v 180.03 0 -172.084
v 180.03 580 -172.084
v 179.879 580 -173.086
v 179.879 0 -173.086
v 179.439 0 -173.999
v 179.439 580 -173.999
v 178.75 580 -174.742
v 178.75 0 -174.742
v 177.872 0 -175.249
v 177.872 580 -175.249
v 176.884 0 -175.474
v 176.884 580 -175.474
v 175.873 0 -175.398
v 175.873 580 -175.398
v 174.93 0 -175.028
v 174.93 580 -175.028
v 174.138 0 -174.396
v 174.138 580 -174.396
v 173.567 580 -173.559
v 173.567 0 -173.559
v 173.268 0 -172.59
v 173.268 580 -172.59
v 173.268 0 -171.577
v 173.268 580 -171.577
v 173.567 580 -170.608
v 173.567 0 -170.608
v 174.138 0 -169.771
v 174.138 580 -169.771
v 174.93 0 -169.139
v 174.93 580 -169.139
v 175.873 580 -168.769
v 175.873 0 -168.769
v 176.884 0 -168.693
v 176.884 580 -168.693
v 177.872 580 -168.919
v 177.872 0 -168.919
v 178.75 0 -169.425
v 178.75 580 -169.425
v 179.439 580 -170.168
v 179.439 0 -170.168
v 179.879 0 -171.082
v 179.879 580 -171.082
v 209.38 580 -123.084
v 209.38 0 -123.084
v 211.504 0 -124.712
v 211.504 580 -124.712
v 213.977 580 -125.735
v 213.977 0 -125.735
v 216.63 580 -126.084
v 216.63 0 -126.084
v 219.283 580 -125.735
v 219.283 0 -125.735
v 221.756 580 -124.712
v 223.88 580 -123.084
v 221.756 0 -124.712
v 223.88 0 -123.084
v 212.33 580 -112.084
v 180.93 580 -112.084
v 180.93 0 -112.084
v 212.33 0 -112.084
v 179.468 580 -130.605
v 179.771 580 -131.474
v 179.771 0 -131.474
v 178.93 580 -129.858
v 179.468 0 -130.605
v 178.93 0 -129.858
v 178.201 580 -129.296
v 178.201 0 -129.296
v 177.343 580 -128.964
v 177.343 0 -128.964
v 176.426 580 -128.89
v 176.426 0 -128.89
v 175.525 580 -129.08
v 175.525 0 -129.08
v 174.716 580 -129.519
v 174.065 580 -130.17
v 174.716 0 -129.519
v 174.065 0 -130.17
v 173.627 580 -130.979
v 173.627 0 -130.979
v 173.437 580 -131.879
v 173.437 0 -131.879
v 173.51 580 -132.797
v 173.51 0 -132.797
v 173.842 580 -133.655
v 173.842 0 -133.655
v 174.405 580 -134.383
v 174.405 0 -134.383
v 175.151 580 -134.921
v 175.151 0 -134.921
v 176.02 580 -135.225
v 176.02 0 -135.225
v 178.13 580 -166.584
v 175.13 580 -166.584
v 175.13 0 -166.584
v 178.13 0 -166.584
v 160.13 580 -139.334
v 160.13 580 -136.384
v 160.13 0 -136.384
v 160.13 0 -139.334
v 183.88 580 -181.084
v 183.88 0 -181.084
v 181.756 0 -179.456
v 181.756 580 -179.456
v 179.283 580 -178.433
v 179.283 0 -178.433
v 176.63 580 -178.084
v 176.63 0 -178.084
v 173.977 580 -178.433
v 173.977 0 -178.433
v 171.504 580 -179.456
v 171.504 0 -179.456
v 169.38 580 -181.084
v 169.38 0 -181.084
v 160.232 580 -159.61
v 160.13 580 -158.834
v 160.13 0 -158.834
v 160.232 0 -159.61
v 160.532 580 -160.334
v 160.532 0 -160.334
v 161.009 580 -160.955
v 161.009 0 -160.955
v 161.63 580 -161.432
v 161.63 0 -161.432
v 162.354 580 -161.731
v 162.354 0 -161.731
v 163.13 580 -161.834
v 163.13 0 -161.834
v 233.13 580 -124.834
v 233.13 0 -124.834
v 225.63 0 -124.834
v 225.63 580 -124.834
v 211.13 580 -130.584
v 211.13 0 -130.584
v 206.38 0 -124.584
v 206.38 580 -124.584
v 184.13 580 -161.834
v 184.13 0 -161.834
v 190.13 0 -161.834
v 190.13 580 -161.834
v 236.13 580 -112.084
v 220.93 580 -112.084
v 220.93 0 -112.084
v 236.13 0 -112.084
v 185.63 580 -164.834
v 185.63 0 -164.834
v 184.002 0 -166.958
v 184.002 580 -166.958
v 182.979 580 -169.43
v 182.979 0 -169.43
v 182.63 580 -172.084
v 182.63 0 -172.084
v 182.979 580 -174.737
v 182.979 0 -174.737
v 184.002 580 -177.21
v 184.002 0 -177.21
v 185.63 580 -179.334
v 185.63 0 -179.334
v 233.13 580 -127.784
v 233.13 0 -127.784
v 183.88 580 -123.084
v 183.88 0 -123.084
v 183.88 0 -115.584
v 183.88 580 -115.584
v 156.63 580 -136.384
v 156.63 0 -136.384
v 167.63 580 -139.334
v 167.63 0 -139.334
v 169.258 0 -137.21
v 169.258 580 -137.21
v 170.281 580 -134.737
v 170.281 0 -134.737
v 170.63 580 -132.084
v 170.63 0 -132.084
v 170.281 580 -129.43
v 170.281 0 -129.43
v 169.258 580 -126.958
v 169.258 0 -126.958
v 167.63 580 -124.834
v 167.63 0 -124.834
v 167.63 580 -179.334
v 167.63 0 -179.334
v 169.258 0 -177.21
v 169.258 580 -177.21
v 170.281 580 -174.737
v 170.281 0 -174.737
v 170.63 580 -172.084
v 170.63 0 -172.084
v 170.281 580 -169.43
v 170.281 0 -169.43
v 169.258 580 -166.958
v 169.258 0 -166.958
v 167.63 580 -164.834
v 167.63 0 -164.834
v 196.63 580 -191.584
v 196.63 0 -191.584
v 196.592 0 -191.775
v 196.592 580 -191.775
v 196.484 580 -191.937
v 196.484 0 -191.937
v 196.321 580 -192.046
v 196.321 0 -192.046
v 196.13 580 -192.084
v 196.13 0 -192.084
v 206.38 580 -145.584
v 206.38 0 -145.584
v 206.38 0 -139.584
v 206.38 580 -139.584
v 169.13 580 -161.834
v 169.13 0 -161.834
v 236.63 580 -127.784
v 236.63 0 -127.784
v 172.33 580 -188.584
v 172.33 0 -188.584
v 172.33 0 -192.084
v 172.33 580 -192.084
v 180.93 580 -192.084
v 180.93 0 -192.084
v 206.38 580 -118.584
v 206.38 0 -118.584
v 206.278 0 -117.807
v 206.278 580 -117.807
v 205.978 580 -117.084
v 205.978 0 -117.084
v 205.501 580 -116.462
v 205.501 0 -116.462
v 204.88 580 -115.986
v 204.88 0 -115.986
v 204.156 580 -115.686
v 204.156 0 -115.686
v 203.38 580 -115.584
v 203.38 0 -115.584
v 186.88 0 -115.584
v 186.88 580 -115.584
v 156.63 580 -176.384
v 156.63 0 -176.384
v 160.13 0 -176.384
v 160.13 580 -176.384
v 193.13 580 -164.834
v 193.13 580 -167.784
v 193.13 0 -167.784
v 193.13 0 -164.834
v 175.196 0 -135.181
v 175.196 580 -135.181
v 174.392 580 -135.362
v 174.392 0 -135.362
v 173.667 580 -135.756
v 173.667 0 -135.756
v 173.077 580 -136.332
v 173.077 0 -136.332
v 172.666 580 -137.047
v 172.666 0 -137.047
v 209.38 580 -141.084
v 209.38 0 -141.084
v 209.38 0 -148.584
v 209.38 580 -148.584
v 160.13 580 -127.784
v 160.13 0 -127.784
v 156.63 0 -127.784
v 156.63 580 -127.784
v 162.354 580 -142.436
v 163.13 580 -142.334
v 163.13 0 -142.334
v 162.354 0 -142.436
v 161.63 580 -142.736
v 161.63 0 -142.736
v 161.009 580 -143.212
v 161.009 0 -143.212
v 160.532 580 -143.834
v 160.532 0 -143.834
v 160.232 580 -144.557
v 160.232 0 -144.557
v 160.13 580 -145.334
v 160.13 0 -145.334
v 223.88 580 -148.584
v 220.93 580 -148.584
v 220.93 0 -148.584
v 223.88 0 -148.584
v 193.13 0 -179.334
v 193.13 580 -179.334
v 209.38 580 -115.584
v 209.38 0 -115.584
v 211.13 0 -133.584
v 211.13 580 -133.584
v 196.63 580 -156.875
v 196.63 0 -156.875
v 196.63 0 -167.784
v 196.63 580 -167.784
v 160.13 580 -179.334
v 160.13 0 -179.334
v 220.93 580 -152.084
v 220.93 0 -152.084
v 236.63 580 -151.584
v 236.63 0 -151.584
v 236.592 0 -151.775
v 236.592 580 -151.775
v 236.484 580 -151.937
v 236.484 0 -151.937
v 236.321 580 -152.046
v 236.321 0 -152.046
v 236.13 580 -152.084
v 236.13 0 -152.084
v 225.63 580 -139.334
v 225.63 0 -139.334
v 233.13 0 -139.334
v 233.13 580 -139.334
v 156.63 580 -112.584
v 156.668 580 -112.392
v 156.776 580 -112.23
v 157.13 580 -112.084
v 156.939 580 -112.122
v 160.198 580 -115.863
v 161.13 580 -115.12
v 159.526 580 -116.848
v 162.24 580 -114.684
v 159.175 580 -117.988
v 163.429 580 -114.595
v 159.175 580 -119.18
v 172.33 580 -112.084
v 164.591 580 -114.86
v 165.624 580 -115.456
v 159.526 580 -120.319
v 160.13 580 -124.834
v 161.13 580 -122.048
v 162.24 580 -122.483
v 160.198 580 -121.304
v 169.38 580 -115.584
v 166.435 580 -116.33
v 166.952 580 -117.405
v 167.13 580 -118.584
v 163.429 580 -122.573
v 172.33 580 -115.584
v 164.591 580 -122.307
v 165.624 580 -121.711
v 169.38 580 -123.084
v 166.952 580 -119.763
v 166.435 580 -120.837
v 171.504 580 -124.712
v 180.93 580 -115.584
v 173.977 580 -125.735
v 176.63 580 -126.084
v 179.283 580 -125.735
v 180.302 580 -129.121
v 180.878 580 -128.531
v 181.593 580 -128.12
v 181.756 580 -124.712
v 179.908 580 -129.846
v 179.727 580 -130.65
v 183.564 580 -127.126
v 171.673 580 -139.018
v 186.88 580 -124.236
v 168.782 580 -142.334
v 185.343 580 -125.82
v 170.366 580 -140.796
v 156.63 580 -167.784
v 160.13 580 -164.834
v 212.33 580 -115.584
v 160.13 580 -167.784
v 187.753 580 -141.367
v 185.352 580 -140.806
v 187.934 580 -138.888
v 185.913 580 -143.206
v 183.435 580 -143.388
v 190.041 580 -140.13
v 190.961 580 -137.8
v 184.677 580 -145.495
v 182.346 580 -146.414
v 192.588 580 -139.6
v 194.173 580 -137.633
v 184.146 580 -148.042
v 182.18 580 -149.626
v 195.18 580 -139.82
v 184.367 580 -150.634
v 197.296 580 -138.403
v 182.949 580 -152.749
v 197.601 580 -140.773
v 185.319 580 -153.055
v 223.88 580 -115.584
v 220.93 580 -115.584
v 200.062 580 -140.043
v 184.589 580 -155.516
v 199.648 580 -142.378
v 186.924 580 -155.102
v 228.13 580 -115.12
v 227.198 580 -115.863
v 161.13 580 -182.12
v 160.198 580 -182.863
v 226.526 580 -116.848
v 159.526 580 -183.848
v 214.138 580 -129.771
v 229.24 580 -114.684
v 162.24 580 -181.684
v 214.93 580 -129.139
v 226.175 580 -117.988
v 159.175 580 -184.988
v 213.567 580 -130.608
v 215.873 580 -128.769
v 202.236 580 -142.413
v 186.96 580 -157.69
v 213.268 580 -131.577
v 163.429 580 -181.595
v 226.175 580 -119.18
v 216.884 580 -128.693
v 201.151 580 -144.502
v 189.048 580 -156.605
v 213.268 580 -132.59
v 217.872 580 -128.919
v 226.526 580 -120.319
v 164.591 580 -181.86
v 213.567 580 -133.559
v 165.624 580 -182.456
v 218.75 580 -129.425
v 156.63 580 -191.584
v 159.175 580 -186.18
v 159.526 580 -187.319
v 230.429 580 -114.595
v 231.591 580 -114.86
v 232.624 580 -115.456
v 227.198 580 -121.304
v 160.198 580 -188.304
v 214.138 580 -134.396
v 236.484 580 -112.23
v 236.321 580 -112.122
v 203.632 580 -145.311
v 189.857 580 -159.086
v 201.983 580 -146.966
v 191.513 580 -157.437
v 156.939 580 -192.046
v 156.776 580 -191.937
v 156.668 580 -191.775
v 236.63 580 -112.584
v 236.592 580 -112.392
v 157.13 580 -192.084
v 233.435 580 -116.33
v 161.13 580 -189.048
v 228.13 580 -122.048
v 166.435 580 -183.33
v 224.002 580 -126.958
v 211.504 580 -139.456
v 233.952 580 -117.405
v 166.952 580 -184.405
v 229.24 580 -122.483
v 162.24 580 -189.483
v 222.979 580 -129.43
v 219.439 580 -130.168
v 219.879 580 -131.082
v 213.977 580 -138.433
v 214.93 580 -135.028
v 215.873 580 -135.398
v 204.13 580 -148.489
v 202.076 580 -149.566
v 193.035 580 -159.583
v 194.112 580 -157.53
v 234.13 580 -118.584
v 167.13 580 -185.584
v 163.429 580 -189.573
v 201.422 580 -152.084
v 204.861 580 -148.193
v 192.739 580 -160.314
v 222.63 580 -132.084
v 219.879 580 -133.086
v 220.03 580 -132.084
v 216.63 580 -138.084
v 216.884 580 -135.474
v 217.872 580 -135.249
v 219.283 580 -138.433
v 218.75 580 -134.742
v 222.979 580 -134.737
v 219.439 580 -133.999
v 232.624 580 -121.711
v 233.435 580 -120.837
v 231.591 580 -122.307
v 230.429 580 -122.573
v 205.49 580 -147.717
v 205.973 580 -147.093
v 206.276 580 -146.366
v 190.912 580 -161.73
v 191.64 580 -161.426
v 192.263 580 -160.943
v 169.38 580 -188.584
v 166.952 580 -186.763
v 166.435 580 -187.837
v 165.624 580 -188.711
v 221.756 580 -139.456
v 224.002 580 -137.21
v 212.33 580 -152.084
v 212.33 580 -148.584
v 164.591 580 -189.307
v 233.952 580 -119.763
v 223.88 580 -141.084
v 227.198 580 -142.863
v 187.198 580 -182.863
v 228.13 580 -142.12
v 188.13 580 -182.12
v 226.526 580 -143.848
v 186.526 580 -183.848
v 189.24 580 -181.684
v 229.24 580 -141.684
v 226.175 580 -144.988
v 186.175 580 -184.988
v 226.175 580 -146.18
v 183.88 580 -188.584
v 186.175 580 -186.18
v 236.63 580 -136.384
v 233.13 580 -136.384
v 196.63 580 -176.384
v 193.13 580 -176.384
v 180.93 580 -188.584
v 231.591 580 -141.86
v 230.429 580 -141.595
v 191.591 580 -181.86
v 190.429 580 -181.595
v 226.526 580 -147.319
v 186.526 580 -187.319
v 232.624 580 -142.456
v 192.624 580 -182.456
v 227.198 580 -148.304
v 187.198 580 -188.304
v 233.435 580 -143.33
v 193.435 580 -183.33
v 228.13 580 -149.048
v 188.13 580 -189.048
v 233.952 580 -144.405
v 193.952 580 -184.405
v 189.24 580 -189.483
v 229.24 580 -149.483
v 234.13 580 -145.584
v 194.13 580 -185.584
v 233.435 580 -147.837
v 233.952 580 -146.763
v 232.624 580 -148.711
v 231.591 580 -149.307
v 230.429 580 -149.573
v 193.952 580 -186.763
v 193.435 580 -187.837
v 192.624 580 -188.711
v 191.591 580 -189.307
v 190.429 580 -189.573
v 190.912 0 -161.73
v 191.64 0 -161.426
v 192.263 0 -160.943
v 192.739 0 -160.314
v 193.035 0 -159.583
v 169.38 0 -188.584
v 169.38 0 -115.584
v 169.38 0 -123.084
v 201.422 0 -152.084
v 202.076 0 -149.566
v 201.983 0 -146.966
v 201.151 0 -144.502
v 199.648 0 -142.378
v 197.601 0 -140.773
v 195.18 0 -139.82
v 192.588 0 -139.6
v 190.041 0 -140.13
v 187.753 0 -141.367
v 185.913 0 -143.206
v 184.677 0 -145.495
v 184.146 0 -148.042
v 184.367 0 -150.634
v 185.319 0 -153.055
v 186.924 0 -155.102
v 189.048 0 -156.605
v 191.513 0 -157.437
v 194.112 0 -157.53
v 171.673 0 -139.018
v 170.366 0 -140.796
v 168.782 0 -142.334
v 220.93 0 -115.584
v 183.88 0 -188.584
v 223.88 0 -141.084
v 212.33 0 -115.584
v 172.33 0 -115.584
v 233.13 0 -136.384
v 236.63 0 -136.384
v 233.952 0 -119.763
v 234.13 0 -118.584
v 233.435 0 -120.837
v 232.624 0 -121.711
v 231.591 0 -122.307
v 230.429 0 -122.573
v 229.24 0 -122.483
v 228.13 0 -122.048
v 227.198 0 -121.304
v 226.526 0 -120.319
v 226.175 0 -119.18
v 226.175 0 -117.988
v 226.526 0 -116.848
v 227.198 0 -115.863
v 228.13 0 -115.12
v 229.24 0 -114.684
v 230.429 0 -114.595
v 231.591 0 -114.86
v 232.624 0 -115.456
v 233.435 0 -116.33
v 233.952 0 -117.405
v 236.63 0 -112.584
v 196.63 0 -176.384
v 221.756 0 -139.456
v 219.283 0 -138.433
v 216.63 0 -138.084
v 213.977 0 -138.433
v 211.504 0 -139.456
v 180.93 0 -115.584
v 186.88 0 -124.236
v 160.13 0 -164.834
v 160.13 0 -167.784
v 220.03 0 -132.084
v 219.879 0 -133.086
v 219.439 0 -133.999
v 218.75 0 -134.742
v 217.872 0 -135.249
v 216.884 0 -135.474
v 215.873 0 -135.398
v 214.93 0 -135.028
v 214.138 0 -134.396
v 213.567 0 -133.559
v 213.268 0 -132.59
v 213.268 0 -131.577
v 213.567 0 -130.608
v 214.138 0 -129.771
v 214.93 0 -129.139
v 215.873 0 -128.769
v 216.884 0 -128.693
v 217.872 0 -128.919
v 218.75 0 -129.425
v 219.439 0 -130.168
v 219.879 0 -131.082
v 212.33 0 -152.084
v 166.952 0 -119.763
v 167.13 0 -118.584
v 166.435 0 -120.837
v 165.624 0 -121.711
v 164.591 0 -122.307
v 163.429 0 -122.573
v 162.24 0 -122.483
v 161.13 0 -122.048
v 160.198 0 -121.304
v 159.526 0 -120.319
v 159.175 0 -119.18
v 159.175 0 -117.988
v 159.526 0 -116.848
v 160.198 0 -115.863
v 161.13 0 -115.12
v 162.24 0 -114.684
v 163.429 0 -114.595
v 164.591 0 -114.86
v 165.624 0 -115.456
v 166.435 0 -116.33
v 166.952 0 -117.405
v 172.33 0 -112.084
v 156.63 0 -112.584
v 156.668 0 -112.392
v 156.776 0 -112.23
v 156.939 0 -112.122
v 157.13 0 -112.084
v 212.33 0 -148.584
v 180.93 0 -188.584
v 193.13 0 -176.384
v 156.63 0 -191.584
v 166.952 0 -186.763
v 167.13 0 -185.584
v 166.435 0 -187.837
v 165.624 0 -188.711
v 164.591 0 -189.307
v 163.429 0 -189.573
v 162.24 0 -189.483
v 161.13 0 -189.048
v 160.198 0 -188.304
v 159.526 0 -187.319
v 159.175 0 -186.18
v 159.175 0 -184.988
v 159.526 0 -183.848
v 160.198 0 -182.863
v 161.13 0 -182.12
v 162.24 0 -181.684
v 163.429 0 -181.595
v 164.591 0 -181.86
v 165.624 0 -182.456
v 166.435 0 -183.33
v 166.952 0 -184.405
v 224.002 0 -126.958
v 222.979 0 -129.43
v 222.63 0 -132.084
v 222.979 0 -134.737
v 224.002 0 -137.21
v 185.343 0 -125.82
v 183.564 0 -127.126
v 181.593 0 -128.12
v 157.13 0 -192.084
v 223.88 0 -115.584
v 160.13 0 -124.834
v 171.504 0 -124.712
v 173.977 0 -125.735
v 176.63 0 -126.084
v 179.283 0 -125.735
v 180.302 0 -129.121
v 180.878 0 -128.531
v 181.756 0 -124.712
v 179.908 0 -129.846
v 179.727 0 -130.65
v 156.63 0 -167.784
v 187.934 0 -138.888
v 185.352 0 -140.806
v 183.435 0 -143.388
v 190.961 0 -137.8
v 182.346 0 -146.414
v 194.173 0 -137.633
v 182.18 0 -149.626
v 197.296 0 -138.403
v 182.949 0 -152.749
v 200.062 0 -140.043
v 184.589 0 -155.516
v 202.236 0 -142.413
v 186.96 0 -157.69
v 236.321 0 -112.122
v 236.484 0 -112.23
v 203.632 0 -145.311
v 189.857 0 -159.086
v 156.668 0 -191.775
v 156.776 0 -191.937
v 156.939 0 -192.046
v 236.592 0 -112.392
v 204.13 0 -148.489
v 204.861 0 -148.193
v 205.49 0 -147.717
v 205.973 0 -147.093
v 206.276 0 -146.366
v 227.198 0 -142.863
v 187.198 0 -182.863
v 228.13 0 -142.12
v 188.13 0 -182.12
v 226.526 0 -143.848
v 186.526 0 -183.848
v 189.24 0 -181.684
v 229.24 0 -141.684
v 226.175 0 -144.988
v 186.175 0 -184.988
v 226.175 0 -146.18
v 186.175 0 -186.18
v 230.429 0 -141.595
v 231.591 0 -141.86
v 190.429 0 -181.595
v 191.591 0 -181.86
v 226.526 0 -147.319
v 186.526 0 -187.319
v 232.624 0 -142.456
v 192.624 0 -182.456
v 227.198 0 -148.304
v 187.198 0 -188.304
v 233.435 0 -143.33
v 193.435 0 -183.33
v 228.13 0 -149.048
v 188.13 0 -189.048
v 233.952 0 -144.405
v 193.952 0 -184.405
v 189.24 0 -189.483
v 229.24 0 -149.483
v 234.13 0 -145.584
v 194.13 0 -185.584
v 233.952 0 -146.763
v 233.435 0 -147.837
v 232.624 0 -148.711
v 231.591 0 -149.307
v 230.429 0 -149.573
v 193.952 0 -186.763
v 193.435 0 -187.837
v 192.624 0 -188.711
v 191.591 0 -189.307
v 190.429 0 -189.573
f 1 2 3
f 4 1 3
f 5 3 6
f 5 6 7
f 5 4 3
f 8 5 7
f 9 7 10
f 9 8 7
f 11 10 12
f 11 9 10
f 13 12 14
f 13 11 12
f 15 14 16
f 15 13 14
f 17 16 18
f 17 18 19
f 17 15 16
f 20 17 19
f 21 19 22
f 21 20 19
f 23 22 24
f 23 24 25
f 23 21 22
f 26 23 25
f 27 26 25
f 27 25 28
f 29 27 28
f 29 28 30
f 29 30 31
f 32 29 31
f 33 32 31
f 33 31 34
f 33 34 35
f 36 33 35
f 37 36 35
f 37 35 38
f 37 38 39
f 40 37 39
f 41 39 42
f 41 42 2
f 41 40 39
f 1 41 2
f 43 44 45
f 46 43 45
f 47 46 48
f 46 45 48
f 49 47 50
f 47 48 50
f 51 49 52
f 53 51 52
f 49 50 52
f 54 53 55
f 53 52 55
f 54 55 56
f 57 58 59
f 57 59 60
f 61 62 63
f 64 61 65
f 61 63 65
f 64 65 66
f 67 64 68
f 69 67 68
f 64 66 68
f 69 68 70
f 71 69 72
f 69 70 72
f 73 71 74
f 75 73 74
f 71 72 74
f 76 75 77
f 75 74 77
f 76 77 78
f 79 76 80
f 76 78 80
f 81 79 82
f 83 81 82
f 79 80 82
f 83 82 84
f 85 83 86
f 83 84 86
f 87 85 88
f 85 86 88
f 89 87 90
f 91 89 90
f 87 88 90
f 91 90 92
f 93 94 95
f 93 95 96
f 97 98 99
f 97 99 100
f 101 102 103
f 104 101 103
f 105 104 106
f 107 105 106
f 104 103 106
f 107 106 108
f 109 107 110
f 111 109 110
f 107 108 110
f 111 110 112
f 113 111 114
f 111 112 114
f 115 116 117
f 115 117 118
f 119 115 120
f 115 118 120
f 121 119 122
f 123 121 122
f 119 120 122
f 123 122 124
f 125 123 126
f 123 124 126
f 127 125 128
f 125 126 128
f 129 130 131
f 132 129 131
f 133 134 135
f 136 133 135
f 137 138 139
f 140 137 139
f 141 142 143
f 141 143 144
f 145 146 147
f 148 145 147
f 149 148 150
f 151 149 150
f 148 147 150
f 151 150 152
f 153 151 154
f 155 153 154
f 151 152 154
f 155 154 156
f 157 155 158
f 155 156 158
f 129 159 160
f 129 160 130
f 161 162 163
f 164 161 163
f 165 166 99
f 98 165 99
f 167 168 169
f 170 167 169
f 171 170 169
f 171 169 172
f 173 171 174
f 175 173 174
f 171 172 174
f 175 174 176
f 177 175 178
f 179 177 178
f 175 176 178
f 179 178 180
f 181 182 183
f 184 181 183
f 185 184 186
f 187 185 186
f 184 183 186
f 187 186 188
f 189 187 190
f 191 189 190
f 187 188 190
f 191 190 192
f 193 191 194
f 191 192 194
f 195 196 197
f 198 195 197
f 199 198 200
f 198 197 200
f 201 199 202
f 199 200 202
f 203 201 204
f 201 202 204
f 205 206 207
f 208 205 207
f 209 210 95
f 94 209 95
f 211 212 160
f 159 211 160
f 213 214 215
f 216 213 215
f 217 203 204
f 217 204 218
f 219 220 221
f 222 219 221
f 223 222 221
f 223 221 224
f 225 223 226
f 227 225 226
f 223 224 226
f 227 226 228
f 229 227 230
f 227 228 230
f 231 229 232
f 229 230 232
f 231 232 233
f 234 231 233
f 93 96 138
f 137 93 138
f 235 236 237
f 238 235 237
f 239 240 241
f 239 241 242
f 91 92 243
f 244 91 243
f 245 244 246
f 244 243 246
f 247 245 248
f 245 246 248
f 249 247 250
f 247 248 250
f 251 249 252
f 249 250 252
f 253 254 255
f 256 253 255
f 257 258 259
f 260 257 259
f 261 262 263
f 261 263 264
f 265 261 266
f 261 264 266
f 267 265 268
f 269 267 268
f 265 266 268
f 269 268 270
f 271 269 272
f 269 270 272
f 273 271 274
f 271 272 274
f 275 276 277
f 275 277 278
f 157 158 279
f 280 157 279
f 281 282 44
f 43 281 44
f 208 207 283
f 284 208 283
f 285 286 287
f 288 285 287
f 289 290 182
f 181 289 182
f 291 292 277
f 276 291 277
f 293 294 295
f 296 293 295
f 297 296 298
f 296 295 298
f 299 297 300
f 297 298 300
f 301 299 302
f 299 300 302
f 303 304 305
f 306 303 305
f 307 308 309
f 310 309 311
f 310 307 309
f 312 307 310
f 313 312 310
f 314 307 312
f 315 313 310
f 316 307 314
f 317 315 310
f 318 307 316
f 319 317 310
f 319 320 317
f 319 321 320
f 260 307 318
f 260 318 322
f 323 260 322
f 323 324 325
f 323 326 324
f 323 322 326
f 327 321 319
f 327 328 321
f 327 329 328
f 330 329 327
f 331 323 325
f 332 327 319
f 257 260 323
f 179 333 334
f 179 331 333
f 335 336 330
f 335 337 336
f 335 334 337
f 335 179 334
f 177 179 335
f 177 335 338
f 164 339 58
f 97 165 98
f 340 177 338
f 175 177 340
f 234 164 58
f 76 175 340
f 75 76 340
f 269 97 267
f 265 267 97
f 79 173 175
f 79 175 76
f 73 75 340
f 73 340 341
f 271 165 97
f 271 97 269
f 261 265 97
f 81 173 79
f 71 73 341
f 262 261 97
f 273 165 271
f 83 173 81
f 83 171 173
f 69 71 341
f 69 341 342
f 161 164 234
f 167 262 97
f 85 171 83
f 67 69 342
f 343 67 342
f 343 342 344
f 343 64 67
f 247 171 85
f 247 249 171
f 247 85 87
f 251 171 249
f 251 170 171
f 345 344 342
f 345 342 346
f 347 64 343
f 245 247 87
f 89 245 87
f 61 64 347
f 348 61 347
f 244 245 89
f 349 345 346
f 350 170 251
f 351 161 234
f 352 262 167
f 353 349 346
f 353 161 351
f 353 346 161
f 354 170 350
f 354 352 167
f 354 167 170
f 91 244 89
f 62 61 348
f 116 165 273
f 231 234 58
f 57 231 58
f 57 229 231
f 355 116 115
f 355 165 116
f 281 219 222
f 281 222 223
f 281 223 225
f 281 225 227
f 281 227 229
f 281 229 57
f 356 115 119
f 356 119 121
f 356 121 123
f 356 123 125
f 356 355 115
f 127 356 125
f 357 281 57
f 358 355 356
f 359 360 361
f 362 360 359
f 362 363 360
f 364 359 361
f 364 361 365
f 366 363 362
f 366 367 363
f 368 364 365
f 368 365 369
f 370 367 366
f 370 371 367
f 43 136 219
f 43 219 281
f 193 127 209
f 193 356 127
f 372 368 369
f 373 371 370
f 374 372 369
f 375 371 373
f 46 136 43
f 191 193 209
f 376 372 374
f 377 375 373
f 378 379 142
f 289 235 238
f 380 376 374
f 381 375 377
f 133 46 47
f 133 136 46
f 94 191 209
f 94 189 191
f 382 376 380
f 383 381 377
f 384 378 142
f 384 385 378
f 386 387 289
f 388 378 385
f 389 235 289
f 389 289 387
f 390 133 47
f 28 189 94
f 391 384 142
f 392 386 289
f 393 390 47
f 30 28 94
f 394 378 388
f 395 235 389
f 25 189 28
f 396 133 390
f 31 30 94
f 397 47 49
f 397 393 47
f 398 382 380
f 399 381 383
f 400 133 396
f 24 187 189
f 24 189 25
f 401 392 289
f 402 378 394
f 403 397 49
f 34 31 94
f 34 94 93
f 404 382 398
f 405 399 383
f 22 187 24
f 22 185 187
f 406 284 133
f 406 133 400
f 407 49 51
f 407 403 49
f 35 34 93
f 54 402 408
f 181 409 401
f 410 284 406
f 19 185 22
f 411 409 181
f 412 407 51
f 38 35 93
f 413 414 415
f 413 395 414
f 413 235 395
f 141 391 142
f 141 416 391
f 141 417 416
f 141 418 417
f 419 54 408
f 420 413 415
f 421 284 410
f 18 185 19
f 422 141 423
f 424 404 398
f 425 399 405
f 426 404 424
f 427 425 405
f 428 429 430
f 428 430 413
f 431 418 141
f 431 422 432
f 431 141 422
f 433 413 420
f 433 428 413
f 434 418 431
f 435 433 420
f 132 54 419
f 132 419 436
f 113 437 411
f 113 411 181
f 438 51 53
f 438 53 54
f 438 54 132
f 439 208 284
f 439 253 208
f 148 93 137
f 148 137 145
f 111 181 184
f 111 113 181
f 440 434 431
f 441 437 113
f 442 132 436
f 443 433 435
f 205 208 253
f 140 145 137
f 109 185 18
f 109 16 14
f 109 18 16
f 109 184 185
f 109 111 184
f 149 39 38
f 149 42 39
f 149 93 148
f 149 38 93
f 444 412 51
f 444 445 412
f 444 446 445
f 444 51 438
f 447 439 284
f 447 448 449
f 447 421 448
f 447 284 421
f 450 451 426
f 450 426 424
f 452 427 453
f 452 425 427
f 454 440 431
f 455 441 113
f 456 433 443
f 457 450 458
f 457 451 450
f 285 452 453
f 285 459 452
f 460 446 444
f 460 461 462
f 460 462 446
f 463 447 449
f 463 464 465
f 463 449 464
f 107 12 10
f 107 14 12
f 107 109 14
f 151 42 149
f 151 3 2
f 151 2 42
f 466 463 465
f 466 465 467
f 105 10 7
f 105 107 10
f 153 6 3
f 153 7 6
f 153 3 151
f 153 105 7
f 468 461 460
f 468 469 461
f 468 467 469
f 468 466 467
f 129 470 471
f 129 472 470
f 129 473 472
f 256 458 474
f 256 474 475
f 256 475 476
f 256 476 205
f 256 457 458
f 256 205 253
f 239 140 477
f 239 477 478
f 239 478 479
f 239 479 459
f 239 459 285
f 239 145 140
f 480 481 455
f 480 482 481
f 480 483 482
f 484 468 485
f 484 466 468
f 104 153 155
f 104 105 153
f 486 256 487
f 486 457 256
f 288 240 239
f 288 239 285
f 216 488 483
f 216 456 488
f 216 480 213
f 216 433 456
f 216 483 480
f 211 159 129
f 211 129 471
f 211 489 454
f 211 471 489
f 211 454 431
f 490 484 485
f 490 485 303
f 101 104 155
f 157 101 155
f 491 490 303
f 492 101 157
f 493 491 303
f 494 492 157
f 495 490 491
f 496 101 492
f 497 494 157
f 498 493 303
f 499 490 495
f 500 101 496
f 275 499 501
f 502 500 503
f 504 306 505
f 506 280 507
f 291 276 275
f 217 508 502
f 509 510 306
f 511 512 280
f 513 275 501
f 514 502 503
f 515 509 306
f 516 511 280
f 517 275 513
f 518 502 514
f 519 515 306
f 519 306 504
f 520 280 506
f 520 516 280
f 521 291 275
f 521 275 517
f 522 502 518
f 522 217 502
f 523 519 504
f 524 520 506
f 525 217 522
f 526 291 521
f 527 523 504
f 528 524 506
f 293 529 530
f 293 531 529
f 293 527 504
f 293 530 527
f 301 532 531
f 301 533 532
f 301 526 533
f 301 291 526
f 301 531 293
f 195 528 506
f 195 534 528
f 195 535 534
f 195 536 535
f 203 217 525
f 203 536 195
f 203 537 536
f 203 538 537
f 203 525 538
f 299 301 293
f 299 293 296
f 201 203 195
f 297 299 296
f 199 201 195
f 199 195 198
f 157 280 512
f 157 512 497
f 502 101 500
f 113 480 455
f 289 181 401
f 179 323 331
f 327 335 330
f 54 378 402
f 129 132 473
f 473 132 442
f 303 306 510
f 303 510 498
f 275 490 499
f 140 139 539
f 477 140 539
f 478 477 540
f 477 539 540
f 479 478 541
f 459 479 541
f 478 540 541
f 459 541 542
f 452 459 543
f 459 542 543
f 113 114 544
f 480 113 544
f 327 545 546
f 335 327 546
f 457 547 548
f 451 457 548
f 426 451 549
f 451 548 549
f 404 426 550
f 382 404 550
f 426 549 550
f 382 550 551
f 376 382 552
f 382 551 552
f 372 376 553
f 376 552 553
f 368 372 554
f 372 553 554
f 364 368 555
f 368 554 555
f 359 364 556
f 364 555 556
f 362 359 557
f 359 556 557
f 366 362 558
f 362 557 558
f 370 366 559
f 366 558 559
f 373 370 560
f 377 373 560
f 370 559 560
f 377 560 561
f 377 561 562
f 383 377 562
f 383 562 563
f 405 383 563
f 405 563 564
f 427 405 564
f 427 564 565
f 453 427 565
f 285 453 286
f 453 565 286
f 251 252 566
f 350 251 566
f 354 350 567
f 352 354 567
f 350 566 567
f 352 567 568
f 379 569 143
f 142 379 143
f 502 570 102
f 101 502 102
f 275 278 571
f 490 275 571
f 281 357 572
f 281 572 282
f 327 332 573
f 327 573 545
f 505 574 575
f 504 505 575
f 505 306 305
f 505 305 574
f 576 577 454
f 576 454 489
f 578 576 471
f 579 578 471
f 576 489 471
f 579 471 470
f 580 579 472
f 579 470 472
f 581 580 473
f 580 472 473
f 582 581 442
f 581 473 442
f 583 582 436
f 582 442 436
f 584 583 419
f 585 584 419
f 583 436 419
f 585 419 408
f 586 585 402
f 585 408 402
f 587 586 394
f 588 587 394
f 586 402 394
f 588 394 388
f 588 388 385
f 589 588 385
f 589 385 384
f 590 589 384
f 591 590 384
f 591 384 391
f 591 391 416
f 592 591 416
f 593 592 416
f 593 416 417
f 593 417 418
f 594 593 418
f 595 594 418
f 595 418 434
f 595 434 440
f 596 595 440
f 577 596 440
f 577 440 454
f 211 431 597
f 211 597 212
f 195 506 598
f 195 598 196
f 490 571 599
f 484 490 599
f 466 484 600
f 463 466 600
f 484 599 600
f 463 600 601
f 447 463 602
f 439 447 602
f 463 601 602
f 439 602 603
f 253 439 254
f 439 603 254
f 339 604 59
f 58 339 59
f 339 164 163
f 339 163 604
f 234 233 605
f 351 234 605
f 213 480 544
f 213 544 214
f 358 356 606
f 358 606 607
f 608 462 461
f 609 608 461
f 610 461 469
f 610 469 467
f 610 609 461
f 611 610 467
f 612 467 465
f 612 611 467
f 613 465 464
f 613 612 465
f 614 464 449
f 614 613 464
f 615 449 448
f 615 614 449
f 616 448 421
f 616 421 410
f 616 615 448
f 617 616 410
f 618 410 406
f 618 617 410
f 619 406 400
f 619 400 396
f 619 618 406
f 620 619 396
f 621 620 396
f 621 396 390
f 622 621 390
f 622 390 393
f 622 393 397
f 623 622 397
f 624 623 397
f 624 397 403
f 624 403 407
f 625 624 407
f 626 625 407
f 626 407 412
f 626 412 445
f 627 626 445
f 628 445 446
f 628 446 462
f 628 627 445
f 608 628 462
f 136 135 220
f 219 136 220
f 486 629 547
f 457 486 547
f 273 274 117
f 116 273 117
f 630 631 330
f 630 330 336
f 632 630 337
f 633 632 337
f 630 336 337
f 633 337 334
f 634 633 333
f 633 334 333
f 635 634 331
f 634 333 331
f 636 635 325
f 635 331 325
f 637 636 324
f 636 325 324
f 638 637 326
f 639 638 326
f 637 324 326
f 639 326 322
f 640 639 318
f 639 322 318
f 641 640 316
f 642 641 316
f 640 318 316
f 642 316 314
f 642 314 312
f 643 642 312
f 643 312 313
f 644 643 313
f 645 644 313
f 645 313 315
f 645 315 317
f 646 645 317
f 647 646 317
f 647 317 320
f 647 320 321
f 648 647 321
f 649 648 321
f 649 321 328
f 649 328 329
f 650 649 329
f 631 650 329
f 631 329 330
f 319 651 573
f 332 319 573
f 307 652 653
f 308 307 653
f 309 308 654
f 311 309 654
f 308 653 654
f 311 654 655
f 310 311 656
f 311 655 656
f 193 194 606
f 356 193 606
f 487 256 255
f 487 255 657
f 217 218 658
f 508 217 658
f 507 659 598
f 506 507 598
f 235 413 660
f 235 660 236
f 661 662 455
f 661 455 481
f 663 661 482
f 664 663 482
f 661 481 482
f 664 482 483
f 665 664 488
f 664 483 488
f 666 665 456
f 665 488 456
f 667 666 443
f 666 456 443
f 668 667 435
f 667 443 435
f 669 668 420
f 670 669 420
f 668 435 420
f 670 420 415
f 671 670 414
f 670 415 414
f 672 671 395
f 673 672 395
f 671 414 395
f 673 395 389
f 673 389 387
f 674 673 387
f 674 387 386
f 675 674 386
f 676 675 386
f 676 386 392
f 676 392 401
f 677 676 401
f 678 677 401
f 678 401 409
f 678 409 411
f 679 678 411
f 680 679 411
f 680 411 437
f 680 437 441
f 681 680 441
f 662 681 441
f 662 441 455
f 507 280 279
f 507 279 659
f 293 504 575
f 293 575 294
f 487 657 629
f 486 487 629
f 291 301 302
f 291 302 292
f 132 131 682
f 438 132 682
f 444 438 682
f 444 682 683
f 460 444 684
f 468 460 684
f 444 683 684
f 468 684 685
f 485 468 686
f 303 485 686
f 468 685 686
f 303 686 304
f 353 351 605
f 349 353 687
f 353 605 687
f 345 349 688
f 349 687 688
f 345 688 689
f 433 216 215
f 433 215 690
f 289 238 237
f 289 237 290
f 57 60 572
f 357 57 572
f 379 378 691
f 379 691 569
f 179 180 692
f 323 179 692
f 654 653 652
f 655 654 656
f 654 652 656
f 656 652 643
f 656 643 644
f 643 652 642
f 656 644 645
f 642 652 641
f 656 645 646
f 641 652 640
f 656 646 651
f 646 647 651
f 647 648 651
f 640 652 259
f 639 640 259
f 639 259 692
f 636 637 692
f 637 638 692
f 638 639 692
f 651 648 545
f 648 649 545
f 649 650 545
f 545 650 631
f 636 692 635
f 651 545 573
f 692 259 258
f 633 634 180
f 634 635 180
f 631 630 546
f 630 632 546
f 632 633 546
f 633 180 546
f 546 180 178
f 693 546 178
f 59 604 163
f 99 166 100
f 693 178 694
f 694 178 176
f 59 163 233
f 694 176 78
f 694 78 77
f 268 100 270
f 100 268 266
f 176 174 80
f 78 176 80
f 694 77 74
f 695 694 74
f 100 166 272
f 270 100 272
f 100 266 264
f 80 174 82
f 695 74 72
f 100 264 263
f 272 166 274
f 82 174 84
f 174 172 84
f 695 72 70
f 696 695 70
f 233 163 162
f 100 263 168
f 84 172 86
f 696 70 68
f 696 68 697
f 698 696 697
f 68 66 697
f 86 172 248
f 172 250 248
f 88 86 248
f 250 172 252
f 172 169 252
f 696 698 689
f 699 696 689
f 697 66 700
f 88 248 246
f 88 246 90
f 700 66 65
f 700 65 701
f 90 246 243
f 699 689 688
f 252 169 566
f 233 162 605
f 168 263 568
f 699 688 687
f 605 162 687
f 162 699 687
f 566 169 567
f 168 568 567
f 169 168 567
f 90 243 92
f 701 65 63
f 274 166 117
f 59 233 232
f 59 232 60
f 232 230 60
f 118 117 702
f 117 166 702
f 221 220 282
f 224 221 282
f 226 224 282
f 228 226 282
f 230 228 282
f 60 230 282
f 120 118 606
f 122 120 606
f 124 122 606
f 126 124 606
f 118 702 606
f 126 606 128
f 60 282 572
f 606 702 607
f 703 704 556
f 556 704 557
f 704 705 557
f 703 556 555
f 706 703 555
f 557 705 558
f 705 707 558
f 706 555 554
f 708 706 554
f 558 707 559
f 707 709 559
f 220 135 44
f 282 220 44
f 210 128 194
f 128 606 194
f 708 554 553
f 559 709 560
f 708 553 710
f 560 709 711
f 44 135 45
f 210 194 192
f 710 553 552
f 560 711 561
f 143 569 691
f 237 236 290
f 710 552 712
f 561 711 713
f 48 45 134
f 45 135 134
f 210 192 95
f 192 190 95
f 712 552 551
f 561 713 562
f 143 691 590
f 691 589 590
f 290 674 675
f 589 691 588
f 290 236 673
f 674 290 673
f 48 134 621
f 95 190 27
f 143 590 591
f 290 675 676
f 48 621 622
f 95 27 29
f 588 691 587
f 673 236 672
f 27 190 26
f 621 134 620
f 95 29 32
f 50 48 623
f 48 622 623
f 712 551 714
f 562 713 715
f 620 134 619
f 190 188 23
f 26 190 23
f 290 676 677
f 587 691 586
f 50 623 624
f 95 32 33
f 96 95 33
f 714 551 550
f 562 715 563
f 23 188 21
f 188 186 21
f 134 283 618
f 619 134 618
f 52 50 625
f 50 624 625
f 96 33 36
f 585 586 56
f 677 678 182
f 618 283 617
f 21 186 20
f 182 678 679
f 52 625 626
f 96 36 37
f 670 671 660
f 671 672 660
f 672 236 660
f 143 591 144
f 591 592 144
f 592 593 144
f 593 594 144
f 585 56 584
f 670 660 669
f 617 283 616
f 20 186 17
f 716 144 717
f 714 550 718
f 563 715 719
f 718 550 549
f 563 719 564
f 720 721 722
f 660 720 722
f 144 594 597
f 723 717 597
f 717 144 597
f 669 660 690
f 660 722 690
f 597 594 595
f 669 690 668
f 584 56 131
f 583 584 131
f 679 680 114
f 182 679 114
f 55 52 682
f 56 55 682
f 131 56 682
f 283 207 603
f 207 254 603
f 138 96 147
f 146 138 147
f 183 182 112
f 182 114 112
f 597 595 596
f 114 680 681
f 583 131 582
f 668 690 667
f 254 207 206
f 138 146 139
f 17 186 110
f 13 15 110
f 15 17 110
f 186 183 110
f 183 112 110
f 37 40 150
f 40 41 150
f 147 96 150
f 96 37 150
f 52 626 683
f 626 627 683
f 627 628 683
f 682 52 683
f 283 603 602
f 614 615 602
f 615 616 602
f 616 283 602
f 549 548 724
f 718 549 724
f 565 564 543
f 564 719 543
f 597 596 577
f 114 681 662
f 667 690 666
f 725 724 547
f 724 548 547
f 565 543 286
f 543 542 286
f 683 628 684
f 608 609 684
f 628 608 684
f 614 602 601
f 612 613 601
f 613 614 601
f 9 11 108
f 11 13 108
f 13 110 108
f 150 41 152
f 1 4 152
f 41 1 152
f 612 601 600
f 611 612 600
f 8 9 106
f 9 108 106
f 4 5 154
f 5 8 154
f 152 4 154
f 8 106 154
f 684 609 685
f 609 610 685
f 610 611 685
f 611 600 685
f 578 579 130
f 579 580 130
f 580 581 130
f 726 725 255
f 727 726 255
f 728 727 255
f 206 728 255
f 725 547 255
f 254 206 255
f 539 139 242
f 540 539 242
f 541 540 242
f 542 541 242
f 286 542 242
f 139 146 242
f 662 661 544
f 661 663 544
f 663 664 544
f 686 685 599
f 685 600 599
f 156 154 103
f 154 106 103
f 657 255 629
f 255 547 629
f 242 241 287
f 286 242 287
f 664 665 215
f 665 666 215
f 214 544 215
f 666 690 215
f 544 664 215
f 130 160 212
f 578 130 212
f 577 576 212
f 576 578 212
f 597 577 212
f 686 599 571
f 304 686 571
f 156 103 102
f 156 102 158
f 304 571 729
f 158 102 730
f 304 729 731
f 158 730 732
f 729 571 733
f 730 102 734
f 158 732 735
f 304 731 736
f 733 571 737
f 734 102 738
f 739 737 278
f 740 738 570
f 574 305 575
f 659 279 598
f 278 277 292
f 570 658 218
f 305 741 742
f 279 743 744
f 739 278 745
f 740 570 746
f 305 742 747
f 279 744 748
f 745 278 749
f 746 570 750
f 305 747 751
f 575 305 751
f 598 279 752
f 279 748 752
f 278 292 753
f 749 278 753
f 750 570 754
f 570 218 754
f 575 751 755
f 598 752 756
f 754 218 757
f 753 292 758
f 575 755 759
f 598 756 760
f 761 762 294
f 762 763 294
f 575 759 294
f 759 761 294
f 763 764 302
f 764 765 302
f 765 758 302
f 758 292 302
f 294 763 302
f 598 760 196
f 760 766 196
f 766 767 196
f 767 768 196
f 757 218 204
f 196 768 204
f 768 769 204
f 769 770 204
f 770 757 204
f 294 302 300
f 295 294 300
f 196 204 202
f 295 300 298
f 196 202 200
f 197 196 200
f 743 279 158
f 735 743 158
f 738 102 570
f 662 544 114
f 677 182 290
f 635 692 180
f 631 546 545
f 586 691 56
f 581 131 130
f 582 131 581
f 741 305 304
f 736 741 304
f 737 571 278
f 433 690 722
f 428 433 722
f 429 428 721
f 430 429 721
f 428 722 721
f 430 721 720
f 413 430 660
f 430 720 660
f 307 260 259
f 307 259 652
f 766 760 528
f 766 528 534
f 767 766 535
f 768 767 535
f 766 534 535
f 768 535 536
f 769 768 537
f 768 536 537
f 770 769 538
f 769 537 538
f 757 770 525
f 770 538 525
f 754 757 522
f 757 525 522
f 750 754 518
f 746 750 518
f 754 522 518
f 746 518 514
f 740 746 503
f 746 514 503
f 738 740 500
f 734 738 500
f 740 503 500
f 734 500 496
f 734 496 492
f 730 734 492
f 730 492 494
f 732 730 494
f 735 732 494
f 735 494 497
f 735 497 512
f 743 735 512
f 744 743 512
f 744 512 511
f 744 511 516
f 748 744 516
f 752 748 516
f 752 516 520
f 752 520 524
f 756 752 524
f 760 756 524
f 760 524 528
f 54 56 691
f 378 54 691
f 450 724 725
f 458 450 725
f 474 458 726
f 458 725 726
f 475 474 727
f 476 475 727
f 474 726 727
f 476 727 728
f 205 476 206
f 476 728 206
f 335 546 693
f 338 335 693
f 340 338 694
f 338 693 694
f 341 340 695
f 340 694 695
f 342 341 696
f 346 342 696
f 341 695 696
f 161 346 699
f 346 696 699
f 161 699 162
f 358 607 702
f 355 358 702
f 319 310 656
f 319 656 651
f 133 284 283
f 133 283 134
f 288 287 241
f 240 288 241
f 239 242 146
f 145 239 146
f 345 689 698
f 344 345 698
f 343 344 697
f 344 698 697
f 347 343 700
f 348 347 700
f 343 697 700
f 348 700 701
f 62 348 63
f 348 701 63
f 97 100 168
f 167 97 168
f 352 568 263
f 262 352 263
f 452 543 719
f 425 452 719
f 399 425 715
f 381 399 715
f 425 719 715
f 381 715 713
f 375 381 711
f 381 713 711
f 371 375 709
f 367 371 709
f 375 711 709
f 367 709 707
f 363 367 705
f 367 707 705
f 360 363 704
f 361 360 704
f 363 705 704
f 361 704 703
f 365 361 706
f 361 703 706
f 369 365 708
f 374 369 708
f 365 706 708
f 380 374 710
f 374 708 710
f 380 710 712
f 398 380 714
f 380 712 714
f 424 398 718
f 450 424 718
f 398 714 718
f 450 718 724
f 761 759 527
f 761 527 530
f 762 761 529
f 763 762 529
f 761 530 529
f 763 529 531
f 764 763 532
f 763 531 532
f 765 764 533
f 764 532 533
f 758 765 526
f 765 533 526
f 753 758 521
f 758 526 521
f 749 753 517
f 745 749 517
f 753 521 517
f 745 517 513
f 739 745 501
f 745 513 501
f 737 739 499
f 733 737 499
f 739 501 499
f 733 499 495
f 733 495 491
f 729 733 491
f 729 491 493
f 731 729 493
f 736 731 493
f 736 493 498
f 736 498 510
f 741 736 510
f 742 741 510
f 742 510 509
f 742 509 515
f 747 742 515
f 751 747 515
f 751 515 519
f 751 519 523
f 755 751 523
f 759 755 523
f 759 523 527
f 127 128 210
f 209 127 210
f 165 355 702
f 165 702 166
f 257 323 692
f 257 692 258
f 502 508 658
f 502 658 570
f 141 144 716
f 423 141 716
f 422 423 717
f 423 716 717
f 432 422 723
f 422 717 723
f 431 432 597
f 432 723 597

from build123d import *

# Parameters (mm, degrees)
SKETCH_2_R          = 4
SKETCH_2_R_2        = 3.4
EXTRUDE_1_DEPTH     = 580
SKETCH_3_R          = 5.341354258
SKETCH_3_R_2        = 5.383492222
SKETCH_3_R_3        = 4.933832051
SKETCH_3_R_4        = 5.418030405
SKETCH_3_R_5        = 5.574298651
EXTRUDE_2_DEPTH     = 580
SKETCH_4_R          = 4
CUT_EXTRUDE_1_DEPTH = 581


with BuildPart() as part:
    # 草图2 → 凸台-拉伸1 (new body)
    with BuildSketch(Plane(origin=(0, 0, 0), x_dir=(1, 0, 0), z_dir=(0, 1, 0))):
        with BuildLine():
            Line((212.330022346, 152.083698324), (201.421584322, 152.083698324))
            ThreePointArc((201.421584322, 152.083698324), (186.766061316, 142.219737293), (196.630022346, 156.8752603))
            Line((196.630022346, 156.8752603), (196.630022346, 167.783698324))
            Line((196.630022346, 167.783698324), (193.130022346, 167.783698324))
            Line((193.130022346, 167.783698324), (193.130022346, 164.833698324))
            Line((193.130022346, 164.833698324), (185.630022346, 164.833698324))
            ThreePointArc((185.630022346, 164.833698324), (182.630022346, 172.083698324), (185.630022346, 179.333698324))
            Line((185.630022346, 179.333698324), (193.130022346, 179.333698324))
            Line((193.130022346, 179.333698324), (193.130022346, 176.383698324))
            Line((193.130022346, 176.383698324), (196.630022346, 176.383698324))
            Line((196.630022346, 176.383698324), (196.630022346, 191.583698324))
            ThreePointArc((196.630022346, 191.583698324), (196.483575737, 191.937251715), (196.130022346, 192.083698324))
            Line((196.130022346, 192.083698324), (180.930022346, 192.083698324))
            Line((180.930022346, 192.083698324), (180.930022346, 188.583698324))
            Line((180.930022346, 188.583698324), (183.880022346, 188.583698324))
            Line((183.880022346, 188.583698324), (183.880022346, 181.083698324))
            ThreePointArc((183.880022346, 181.083698324), (176.630022346, 178.083698324), (169.380022346, 181.083698324))
            Line((169.380022346, 181.083698324), (169.380022346, 188.583698324))
            Line((169.380022346, 188.583698324), (172.330022346, 188.583698324))
            Line((172.330022346, 188.583698324), (172.330022346, 192.083698324))
            Line((172.330022346, 192.083698324), (157.130022346, 192.083698324))
            ThreePointArc((157.130022346, 192.083698324), (156.776468956, 191.937251715), (156.630022346, 191.583698324))
            Line((156.630022346, 191.583698324), (156.630022346, 176.383698324))
            Line((156.630022346, 176.383698324), (160.130022346, 176.383698324))
            Line((160.130022346, 176.383698324), (160.130022346, 179.333698324))
            Line((160.130022346, 179.333698324), (167.630022346, 179.333698324))
            ThreePointArc((167.630022346, 179.333698324), (170.630022346, 172.083698324), (167.630022346, 164.833698324))
            Line((167.630022346, 164.833698324), (160.130022346, 164.833698324))
            Line((160.130022346, 164.833698324), (160.130022346, 167.783698324))
            Line((160.130022346, 167.783698324), (156.630022346, 167.783698324))
            Line((156.630022346, 167.783698324), (156.630022346, 136.383698324))
            Line((156.630022346, 136.383698324), (160.130022346, 136.383698324))
            Line((160.130022346, 136.383698324), (160.130022346, 139.333698324))
            Line((160.130022346, 139.333698324), (167.630022346, 139.333698324))
            ThreePointArc((167.630022346, 139.333698324), (170.630022346, 132.083698324), (167.630022346, 124.833698324))
            Line((167.630022346, 124.833698324), (160.130022346, 124.833698324))
            Line((160.130022346, 124.833698324), (160.130022346, 127.783698324))
            Line((160.130022346, 127.783698324), (156.630022346, 127.783698324))
            Line((156.630022346, 127.783698324), (156.630022346, 112.583698324))
            ThreePointArc((156.630022346, 112.583698324), (156.776468956, 112.230144933), (157.130022346, 112.083698324))
            Line((157.130022346, 112.083698324), (172.330022346, 112.083698324))
            Line((172.330022346, 112.083698324), (172.330022346, 115.583698324))
            Line((172.330022346, 115.583698324), (169.380022346, 115.583698324))
            Line((169.380022346, 115.583698324), (169.380022346, 123.083698324))
            ThreePointArc((169.380022346, 123.083698324), (176.630022346, 126.083698324), (183.880022346, 123.083698324))
            Line((183.880022346, 123.083698324), (183.880022346, 115.583698324))
            Line((183.880022346, 115.583698324), (180.930022346, 115.583698324))
            Line((180.930022346, 115.583698324), (180.930022346, 112.083698324))
            Line((180.930022346, 112.083698324), (196.130022346, 112.083698324))
            Line((196.130022346, 112.083698324), (212.330022346, 112.083698324))
            Line((212.330022346, 112.083698324), (212.330022346, 115.583698324))
            Line((212.330022346, 115.583698324), (209.380022346, 115.583698324))
            Line((209.380022346, 115.583698324), (209.380022346, 123.083698324))
            ThreePointArc((209.380022346, 123.083698324), (216.630022346, 126.083698324), (223.880022346, 123.083698324))
            Line((223.880022346, 123.083698324), (223.880022346, 115.583698324))
            Line((223.880022346, 115.583698324), (220.930022346, 115.583698324))
            Line((220.930022346, 115.583698324), (220.930022346, 112.083698324))
            Line((220.930022346, 112.083698324), (236.130022346, 112.083698324))
            ThreePointArc((236.130022346, 112.083698324), (236.483575737, 112.230144933), (236.630022346, 112.583698324))
            Line((236.630022346, 112.583698324), (236.630022346, 127.783698324))
            Line((236.630022346, 127.783698324), (233.130022346, 127.783698324))
            Line((233.130022346, 127.783698324), (233.130022346, 124.833698324))
            Line((233.130022346, 124.833698324), (225.630022346, 124.833698324))
            ThreePointArc((225.630022346, 124.833698324), (222.630022346, 132.083698324), (225.630022346, 139.333698324))
            Line((225.630022346, 139.333698324), (233.130022346, 139.333698324))
            Line((233.130022346, 139.333698324), (233.130022346, 136.383698324))
            Line((233.130022346, 136.383698324), (236.630022346, 136.383698324))
            Line((236.630022346, 136.383698324), (236.630022346, 151.583698324))
            ThreePointArc((236.630022346, 151.583698324), (236.483575737, 151.937251715), (236.130022346, 152.083698324))
            Line((236.130022346, 152.083698324), (220.930022346, 152.083698324))
            Line((220.930022346, 152.083698324), (220.930022346, 148.583698324))
            Line((220.930022346, 148.583698324), (223.880022346, 148.583698324))
            Line((223.880022346, 148.583698324), (223.880022346, 141.083698324))
            ThreePointArc((223.880022346, 141.083698324), (216.630022346, 138.083698324), (209.380022346, 141.083698324))
            Line((209.380022346, 141.083698324), (209.380022346, 148.583698324))
            Line((209.380022346, 148.583698324), (212.330022346, 148.583698324))
            Line((212.330022346, 148.583698324), (212.330022346, 152.083698324))
        make_face()
        with Locations((162.630022346, 118.083698324)):
            Circle(SKETCH_2_R, mode=Mode.SUBTRACT)
        with BuildLine():
            ThreePointArc((206.380022346, 118.583698324), (205.50134269, 116.46237798), (203.380022346, 115.583698324))
            Line((203.380022346, 115.583698324), (186.880022346, 115.583698324))
            Line((186.880022346, 115.583698324), (186.880022346, 124.236137901))
            ThreePointArc((186.880022346, 124.236137901), (184.480651994, 126.510014755), (181.593404213, 128.119764513))
            ThreePointArc((181.593404213, 128.119764513), (180.080209042, 129.469558022), (179.77133004, 131.473627856))
            ThreePointArc((179.77133004, 131.473627856), (174.367280647, 129.820956624), (176.019951879, 135.225006017))
            ThreePointArc((176.019951879, 135.225006017), (174.015882044, 135.53388502), (172.666088535, 137.047080191))
            ThreePointArc((172.666088535, 137.047080191), (171.056338777, 139.934327972), (168.782461923, 142.333698324))
            Line((168.782461923, 142.333698324), (163.130022346, 142.333698324))
            ThreePointArc((163.130022346, 142.333698324), (161.008702003, 143.21237798), (160.130022346, 145.333698324))
            Line((160.130022346, 145.333698324), (160.130022346, 158.833698324))
            ThreePointArc((160.130022346, 158.833698324), (161.008702003, 160.955018668), (163.130022346, 161.833698324))
            Line((163.130022346, 161.833698324), (169.130022346, 161.833698324))
            Line((169.130022346, 161.833698324), (175.130022346, 166.583698324))
            Line((175.130022346, 166.583698324), (178.130022346, 166.583698324))
            Line((178.130022346, 166.583698324), (184.130022346, 161.833698324))
            Line((184.130022346, 161.833698324), (190.130022346, 161.833698324))
            ThreePointArc((190.130022346, 161.833698324), (191.967307675, 161.205276411), (193.034866096, 159.583286739))
            ThreePointArc((193.034866096, 159.583286739), (185.351847753, 140.805523731), (204.129610761, 148.488542073))
            ThreePointArc((204.129610761, 148.488542073), (205.751600433, 147.420983653), (206.380022346, 145.583698324))
            Line((206.380022346, 145.583698324), (206.380022346, 139.583698324))
            Line((206.380022346, 139.583698324), (211.130022346, 133.583698324))
            Line((211.130022346, 133.583698324), (211.130022346, 130.583698324))
            Line((211.130022346, 130.583698324), (206.380022346, 124.583698324))
            Line((206.380022346, 124.583698324), (206.380022346, 118.583698324))
        make_face(mode=Mode.SUBTRACT)
        with Locations((230.630022346, 118.083698324)):
            Circle(SKETCH_2_R, mode=Mode.SUBTRACT)
        with Locations((216.630022346, 132.083698324)):
            Circle(SKETCH_2_R_2, mode=Mode.SUBTRACT)
        with Locations((230.130022346, 145.583698324)):
            Circle(SKETCH_2_R, mode=Mode.SUBTRACT)
        with Locations((176.630022346, 172.083698324)):
            Circle(SKETCH_2_R_2, mode=Mode.SUBTRACT)
        with Locations((163.130022346, 186.083698324)):
            Circle(SKETCH_2_R, mode=Mode.SUBTRACT)
        with Locations((190.130022346, 185.583698324)):
            Circle(SKETCH_2_R, mode=Mode.SUBTRACT)
    extrude(amount=EXTRUDE_1_DEPTH)

    # 草图3 → 凸台-拉伸2 (add)
    with BuildSketch(Plane(origin=(0, 580, 0), x_dir=(1, 0, 0), z_dir=(0, 1, 0))):
        with Locations((163.130022346, 186.083698324)):
            Circle(SKETCH_3_R)
        with Locations((190.130022346, 185.583698324)):
            Circle(SKETCH_3_R_2)
        with Locations((162.630022346, 118.083698324)):
            Circle(SKETCH_3_R_3)
        with Locations((230.630022346, 118.083698324)):
            Circle(SKETCH_3_R_4)
        with Locations((230.130022346, 145.583698324)):
            Circle(SKETCH_3_R_5)
    extrude(amount=-EXTRUDE_2_DEPTH)

    # 草图4 → 切除-拉伸1 (cut, through all)
    with BuildSketch(Plane(origin=(0, 580, 0), x_dir=(1, 0, 0), z_dir=(0, 1, 0))):
        with Locations((163.130022346, 185.583698324)):
            Circle(SKETCH_4_R)
        with Locations((163.130022346, 118.583698324)):
            Circle(SKETCH_4_R)
        with Locations((230.130022346, 118.583698324)):
            Circle(SKETCH_4_R)
        with Locations((230.130022346, 145.583698324)):
            Circle(SKETCH_4_R)
        with Locations((190.130022346, 185.583698324)):
            Circle(SKETCH_4_R)
    extrude(amount=-CUT_EXTRUDE_1_DEPTH, mode=Mode.SUBTRACT)


solid = part.part
